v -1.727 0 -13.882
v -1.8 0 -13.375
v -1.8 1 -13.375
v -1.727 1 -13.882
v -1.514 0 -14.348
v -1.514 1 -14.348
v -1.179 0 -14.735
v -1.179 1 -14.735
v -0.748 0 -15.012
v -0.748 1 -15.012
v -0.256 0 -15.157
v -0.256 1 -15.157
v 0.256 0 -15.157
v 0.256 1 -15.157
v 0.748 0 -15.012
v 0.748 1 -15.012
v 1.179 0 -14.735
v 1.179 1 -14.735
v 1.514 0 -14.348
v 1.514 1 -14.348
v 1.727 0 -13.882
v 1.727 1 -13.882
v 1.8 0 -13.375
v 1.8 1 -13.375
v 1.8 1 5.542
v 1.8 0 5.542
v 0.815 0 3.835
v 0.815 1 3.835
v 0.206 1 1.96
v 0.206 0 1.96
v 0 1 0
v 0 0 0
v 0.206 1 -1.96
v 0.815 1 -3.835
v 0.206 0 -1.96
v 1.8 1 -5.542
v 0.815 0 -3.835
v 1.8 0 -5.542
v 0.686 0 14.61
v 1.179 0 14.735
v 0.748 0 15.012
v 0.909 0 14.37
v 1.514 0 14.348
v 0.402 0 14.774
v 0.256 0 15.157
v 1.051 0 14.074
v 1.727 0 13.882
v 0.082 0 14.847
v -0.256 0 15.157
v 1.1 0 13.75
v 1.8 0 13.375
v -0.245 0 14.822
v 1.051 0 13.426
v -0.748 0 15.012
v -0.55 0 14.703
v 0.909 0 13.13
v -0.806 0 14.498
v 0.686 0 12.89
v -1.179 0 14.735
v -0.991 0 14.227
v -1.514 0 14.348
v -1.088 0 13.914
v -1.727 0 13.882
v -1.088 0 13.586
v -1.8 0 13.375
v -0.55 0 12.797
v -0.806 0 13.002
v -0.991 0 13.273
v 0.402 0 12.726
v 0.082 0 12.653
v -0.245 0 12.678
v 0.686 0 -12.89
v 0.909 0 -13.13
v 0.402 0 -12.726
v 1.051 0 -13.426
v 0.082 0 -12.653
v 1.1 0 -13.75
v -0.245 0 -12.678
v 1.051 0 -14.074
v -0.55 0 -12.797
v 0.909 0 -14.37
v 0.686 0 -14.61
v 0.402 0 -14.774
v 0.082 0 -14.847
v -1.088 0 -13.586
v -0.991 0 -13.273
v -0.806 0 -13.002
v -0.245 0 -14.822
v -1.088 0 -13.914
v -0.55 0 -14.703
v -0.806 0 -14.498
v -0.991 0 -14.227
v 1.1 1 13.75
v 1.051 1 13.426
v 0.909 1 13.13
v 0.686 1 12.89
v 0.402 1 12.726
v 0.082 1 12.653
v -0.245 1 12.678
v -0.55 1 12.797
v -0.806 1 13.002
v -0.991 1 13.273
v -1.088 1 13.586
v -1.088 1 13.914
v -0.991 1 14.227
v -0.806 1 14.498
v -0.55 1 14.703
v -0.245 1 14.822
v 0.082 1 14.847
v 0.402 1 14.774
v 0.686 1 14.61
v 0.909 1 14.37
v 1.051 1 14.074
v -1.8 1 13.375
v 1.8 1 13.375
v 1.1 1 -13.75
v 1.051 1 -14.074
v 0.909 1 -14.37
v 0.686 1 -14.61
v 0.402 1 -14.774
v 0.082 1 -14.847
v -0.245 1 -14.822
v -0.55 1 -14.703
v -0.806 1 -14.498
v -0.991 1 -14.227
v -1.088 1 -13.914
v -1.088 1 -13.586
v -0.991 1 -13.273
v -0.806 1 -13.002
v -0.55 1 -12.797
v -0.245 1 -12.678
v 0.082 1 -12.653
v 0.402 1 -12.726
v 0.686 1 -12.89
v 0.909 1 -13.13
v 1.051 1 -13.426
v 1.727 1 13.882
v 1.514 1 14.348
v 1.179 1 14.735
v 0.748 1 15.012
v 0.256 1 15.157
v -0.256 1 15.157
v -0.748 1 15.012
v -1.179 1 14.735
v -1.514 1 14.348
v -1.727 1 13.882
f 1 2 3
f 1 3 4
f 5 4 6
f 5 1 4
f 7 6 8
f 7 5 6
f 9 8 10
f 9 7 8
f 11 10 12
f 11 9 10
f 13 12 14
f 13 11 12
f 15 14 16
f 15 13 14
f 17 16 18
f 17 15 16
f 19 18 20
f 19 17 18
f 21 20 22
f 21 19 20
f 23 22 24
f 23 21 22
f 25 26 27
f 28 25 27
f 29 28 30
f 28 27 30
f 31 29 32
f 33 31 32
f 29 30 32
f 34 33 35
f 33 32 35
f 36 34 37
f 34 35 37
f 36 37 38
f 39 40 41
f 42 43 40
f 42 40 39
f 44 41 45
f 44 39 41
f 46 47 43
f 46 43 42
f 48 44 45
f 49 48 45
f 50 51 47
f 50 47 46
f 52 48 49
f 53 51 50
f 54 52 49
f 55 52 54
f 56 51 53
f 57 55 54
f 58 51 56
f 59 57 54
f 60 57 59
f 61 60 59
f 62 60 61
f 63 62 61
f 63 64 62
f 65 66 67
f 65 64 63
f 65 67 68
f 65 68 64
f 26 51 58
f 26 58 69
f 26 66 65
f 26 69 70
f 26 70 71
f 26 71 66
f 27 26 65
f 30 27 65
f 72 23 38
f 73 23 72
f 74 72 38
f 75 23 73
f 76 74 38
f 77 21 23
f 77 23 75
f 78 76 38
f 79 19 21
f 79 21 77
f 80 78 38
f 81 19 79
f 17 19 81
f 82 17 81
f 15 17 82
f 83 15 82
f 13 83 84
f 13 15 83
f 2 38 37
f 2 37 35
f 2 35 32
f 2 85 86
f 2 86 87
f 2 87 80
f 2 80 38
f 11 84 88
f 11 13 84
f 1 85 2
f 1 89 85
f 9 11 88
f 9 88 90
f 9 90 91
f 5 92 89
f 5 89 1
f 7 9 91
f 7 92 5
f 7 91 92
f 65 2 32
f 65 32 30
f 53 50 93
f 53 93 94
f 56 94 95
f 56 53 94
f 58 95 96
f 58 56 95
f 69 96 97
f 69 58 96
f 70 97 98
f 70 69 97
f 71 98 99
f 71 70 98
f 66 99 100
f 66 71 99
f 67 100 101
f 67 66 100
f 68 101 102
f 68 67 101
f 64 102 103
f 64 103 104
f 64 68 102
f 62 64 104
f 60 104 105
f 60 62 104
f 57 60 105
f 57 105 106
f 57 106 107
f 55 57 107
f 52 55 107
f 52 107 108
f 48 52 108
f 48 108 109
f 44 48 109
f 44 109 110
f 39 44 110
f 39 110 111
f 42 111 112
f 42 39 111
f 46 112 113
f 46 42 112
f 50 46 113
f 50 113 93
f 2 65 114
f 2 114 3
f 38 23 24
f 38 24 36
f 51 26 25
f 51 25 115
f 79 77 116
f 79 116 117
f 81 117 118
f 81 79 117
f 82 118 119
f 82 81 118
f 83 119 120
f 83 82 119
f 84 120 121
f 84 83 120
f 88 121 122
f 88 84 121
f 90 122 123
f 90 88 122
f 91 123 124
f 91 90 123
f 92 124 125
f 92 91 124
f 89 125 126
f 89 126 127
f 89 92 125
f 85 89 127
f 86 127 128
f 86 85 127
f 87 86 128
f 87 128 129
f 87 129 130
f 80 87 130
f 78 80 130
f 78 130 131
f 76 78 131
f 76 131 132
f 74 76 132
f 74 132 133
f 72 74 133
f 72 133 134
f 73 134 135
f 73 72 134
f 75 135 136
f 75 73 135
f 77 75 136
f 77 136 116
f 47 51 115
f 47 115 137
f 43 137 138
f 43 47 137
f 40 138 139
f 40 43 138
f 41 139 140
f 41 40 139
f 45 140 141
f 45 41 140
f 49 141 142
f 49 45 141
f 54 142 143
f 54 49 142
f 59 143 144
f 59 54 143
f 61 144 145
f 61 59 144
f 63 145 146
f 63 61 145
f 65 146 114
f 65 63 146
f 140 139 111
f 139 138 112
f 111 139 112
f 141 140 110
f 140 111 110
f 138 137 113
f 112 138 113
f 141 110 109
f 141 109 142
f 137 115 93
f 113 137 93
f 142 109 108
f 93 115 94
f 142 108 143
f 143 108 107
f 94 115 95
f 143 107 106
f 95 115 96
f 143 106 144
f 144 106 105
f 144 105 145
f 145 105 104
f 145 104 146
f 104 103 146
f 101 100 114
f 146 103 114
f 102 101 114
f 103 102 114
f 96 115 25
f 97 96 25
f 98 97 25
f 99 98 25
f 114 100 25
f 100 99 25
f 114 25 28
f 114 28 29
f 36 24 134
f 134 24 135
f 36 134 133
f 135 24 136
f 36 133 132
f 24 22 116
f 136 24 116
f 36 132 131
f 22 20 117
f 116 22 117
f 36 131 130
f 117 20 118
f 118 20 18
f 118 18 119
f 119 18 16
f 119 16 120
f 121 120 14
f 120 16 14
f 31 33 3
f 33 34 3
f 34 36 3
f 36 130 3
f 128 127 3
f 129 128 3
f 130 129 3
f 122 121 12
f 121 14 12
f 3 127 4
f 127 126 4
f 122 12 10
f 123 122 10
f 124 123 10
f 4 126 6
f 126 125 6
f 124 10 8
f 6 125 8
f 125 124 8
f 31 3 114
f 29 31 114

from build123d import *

# Parameters (mm, degrees)
SKETCH1_R               = 1.1
BOSS_EXTRUDE1_DEPTH     = 1
SKETCH3_R               = 12.7
CUT_EXTRUDE1_DEPTH      = 2.979898987
CUT_EXTRUDE1_DEPTH_BACK = 2.272792206
CUT_EXTRUDE2_REACH      = 3
SKETCH4_R               = 9.430256121


with BuildPart() as part:
    # Sketch1 → Boss-Extrude1 (new body)
    with BuildSketch(Plane(origin=(0, 0, 0), x_dir=(1, 0, 0), z_dir=(0, 1, 0))):
        with BuildLine():
            Line((-1.8, -13.375), (-1.8, 13.375))
            ThreePointArc((-1.8, 13.375), (0, 15.175), (1.8, 13.375))
            Line((1.8, 13.375), (1.8, -13.375))
            ThreePointArc((1.8, -13.375), (0, -15.175), (-1.8, -13.375))
        make_face()
        with Locations((0, -13.75)):
            Circle(SKETCH1_R, mode=Mode.SUBTRACT)
        with Locations((0, 13.75)):
            Circle(SKETCH1_R, mode=Mode.SUBTRACT)
    extrude(amount=BOSS_EXTRUDE1_DEPTH)

    # Sketch3 → Cut-Extrude1 (cut, two sides)
    with BuildSketch(Plane(origin=(0, 0, 0), x_dir=(0.707106781, -0.707106781, 0), z_dir=(0.707106781, 0.707106781, 0))) as cut_extrude1_sk:
        with Locations((12.7, 0)):
            Circle(SKETCH3_R)
    extrude(amount=CUT_EXTRUDE1_DEPTH, mode=Mode.SUBTRACT)
    extrude(cut_extrude1_sk.sketch, amount=-CUT_EXTRUDE1_DEPTH_BACK, mode=Mode.SUBTRACT)

    # Sketch4 → Cut-Extrude2 (cut, up to next)
    with BuildSketch(Plane.XZ, mode=Mode.PRIVATE) as cut_extrude2_sk1:
        with Locations((9.430256121, 0)):
            Circle(SKETCH4_R)
    cut_extrude2_tool1 = extrude(cut_extrude2_sk1.sketch, amount=-CUT_EXTRUDE2_REACH, mode=Mode.PRIVATE) & part.part
    add(cut_extrude2_tool1.solids().sort_by_distance((9.430256, 0, 0))[0], mode=Mode.SUBTRACT)


solid = part.part
